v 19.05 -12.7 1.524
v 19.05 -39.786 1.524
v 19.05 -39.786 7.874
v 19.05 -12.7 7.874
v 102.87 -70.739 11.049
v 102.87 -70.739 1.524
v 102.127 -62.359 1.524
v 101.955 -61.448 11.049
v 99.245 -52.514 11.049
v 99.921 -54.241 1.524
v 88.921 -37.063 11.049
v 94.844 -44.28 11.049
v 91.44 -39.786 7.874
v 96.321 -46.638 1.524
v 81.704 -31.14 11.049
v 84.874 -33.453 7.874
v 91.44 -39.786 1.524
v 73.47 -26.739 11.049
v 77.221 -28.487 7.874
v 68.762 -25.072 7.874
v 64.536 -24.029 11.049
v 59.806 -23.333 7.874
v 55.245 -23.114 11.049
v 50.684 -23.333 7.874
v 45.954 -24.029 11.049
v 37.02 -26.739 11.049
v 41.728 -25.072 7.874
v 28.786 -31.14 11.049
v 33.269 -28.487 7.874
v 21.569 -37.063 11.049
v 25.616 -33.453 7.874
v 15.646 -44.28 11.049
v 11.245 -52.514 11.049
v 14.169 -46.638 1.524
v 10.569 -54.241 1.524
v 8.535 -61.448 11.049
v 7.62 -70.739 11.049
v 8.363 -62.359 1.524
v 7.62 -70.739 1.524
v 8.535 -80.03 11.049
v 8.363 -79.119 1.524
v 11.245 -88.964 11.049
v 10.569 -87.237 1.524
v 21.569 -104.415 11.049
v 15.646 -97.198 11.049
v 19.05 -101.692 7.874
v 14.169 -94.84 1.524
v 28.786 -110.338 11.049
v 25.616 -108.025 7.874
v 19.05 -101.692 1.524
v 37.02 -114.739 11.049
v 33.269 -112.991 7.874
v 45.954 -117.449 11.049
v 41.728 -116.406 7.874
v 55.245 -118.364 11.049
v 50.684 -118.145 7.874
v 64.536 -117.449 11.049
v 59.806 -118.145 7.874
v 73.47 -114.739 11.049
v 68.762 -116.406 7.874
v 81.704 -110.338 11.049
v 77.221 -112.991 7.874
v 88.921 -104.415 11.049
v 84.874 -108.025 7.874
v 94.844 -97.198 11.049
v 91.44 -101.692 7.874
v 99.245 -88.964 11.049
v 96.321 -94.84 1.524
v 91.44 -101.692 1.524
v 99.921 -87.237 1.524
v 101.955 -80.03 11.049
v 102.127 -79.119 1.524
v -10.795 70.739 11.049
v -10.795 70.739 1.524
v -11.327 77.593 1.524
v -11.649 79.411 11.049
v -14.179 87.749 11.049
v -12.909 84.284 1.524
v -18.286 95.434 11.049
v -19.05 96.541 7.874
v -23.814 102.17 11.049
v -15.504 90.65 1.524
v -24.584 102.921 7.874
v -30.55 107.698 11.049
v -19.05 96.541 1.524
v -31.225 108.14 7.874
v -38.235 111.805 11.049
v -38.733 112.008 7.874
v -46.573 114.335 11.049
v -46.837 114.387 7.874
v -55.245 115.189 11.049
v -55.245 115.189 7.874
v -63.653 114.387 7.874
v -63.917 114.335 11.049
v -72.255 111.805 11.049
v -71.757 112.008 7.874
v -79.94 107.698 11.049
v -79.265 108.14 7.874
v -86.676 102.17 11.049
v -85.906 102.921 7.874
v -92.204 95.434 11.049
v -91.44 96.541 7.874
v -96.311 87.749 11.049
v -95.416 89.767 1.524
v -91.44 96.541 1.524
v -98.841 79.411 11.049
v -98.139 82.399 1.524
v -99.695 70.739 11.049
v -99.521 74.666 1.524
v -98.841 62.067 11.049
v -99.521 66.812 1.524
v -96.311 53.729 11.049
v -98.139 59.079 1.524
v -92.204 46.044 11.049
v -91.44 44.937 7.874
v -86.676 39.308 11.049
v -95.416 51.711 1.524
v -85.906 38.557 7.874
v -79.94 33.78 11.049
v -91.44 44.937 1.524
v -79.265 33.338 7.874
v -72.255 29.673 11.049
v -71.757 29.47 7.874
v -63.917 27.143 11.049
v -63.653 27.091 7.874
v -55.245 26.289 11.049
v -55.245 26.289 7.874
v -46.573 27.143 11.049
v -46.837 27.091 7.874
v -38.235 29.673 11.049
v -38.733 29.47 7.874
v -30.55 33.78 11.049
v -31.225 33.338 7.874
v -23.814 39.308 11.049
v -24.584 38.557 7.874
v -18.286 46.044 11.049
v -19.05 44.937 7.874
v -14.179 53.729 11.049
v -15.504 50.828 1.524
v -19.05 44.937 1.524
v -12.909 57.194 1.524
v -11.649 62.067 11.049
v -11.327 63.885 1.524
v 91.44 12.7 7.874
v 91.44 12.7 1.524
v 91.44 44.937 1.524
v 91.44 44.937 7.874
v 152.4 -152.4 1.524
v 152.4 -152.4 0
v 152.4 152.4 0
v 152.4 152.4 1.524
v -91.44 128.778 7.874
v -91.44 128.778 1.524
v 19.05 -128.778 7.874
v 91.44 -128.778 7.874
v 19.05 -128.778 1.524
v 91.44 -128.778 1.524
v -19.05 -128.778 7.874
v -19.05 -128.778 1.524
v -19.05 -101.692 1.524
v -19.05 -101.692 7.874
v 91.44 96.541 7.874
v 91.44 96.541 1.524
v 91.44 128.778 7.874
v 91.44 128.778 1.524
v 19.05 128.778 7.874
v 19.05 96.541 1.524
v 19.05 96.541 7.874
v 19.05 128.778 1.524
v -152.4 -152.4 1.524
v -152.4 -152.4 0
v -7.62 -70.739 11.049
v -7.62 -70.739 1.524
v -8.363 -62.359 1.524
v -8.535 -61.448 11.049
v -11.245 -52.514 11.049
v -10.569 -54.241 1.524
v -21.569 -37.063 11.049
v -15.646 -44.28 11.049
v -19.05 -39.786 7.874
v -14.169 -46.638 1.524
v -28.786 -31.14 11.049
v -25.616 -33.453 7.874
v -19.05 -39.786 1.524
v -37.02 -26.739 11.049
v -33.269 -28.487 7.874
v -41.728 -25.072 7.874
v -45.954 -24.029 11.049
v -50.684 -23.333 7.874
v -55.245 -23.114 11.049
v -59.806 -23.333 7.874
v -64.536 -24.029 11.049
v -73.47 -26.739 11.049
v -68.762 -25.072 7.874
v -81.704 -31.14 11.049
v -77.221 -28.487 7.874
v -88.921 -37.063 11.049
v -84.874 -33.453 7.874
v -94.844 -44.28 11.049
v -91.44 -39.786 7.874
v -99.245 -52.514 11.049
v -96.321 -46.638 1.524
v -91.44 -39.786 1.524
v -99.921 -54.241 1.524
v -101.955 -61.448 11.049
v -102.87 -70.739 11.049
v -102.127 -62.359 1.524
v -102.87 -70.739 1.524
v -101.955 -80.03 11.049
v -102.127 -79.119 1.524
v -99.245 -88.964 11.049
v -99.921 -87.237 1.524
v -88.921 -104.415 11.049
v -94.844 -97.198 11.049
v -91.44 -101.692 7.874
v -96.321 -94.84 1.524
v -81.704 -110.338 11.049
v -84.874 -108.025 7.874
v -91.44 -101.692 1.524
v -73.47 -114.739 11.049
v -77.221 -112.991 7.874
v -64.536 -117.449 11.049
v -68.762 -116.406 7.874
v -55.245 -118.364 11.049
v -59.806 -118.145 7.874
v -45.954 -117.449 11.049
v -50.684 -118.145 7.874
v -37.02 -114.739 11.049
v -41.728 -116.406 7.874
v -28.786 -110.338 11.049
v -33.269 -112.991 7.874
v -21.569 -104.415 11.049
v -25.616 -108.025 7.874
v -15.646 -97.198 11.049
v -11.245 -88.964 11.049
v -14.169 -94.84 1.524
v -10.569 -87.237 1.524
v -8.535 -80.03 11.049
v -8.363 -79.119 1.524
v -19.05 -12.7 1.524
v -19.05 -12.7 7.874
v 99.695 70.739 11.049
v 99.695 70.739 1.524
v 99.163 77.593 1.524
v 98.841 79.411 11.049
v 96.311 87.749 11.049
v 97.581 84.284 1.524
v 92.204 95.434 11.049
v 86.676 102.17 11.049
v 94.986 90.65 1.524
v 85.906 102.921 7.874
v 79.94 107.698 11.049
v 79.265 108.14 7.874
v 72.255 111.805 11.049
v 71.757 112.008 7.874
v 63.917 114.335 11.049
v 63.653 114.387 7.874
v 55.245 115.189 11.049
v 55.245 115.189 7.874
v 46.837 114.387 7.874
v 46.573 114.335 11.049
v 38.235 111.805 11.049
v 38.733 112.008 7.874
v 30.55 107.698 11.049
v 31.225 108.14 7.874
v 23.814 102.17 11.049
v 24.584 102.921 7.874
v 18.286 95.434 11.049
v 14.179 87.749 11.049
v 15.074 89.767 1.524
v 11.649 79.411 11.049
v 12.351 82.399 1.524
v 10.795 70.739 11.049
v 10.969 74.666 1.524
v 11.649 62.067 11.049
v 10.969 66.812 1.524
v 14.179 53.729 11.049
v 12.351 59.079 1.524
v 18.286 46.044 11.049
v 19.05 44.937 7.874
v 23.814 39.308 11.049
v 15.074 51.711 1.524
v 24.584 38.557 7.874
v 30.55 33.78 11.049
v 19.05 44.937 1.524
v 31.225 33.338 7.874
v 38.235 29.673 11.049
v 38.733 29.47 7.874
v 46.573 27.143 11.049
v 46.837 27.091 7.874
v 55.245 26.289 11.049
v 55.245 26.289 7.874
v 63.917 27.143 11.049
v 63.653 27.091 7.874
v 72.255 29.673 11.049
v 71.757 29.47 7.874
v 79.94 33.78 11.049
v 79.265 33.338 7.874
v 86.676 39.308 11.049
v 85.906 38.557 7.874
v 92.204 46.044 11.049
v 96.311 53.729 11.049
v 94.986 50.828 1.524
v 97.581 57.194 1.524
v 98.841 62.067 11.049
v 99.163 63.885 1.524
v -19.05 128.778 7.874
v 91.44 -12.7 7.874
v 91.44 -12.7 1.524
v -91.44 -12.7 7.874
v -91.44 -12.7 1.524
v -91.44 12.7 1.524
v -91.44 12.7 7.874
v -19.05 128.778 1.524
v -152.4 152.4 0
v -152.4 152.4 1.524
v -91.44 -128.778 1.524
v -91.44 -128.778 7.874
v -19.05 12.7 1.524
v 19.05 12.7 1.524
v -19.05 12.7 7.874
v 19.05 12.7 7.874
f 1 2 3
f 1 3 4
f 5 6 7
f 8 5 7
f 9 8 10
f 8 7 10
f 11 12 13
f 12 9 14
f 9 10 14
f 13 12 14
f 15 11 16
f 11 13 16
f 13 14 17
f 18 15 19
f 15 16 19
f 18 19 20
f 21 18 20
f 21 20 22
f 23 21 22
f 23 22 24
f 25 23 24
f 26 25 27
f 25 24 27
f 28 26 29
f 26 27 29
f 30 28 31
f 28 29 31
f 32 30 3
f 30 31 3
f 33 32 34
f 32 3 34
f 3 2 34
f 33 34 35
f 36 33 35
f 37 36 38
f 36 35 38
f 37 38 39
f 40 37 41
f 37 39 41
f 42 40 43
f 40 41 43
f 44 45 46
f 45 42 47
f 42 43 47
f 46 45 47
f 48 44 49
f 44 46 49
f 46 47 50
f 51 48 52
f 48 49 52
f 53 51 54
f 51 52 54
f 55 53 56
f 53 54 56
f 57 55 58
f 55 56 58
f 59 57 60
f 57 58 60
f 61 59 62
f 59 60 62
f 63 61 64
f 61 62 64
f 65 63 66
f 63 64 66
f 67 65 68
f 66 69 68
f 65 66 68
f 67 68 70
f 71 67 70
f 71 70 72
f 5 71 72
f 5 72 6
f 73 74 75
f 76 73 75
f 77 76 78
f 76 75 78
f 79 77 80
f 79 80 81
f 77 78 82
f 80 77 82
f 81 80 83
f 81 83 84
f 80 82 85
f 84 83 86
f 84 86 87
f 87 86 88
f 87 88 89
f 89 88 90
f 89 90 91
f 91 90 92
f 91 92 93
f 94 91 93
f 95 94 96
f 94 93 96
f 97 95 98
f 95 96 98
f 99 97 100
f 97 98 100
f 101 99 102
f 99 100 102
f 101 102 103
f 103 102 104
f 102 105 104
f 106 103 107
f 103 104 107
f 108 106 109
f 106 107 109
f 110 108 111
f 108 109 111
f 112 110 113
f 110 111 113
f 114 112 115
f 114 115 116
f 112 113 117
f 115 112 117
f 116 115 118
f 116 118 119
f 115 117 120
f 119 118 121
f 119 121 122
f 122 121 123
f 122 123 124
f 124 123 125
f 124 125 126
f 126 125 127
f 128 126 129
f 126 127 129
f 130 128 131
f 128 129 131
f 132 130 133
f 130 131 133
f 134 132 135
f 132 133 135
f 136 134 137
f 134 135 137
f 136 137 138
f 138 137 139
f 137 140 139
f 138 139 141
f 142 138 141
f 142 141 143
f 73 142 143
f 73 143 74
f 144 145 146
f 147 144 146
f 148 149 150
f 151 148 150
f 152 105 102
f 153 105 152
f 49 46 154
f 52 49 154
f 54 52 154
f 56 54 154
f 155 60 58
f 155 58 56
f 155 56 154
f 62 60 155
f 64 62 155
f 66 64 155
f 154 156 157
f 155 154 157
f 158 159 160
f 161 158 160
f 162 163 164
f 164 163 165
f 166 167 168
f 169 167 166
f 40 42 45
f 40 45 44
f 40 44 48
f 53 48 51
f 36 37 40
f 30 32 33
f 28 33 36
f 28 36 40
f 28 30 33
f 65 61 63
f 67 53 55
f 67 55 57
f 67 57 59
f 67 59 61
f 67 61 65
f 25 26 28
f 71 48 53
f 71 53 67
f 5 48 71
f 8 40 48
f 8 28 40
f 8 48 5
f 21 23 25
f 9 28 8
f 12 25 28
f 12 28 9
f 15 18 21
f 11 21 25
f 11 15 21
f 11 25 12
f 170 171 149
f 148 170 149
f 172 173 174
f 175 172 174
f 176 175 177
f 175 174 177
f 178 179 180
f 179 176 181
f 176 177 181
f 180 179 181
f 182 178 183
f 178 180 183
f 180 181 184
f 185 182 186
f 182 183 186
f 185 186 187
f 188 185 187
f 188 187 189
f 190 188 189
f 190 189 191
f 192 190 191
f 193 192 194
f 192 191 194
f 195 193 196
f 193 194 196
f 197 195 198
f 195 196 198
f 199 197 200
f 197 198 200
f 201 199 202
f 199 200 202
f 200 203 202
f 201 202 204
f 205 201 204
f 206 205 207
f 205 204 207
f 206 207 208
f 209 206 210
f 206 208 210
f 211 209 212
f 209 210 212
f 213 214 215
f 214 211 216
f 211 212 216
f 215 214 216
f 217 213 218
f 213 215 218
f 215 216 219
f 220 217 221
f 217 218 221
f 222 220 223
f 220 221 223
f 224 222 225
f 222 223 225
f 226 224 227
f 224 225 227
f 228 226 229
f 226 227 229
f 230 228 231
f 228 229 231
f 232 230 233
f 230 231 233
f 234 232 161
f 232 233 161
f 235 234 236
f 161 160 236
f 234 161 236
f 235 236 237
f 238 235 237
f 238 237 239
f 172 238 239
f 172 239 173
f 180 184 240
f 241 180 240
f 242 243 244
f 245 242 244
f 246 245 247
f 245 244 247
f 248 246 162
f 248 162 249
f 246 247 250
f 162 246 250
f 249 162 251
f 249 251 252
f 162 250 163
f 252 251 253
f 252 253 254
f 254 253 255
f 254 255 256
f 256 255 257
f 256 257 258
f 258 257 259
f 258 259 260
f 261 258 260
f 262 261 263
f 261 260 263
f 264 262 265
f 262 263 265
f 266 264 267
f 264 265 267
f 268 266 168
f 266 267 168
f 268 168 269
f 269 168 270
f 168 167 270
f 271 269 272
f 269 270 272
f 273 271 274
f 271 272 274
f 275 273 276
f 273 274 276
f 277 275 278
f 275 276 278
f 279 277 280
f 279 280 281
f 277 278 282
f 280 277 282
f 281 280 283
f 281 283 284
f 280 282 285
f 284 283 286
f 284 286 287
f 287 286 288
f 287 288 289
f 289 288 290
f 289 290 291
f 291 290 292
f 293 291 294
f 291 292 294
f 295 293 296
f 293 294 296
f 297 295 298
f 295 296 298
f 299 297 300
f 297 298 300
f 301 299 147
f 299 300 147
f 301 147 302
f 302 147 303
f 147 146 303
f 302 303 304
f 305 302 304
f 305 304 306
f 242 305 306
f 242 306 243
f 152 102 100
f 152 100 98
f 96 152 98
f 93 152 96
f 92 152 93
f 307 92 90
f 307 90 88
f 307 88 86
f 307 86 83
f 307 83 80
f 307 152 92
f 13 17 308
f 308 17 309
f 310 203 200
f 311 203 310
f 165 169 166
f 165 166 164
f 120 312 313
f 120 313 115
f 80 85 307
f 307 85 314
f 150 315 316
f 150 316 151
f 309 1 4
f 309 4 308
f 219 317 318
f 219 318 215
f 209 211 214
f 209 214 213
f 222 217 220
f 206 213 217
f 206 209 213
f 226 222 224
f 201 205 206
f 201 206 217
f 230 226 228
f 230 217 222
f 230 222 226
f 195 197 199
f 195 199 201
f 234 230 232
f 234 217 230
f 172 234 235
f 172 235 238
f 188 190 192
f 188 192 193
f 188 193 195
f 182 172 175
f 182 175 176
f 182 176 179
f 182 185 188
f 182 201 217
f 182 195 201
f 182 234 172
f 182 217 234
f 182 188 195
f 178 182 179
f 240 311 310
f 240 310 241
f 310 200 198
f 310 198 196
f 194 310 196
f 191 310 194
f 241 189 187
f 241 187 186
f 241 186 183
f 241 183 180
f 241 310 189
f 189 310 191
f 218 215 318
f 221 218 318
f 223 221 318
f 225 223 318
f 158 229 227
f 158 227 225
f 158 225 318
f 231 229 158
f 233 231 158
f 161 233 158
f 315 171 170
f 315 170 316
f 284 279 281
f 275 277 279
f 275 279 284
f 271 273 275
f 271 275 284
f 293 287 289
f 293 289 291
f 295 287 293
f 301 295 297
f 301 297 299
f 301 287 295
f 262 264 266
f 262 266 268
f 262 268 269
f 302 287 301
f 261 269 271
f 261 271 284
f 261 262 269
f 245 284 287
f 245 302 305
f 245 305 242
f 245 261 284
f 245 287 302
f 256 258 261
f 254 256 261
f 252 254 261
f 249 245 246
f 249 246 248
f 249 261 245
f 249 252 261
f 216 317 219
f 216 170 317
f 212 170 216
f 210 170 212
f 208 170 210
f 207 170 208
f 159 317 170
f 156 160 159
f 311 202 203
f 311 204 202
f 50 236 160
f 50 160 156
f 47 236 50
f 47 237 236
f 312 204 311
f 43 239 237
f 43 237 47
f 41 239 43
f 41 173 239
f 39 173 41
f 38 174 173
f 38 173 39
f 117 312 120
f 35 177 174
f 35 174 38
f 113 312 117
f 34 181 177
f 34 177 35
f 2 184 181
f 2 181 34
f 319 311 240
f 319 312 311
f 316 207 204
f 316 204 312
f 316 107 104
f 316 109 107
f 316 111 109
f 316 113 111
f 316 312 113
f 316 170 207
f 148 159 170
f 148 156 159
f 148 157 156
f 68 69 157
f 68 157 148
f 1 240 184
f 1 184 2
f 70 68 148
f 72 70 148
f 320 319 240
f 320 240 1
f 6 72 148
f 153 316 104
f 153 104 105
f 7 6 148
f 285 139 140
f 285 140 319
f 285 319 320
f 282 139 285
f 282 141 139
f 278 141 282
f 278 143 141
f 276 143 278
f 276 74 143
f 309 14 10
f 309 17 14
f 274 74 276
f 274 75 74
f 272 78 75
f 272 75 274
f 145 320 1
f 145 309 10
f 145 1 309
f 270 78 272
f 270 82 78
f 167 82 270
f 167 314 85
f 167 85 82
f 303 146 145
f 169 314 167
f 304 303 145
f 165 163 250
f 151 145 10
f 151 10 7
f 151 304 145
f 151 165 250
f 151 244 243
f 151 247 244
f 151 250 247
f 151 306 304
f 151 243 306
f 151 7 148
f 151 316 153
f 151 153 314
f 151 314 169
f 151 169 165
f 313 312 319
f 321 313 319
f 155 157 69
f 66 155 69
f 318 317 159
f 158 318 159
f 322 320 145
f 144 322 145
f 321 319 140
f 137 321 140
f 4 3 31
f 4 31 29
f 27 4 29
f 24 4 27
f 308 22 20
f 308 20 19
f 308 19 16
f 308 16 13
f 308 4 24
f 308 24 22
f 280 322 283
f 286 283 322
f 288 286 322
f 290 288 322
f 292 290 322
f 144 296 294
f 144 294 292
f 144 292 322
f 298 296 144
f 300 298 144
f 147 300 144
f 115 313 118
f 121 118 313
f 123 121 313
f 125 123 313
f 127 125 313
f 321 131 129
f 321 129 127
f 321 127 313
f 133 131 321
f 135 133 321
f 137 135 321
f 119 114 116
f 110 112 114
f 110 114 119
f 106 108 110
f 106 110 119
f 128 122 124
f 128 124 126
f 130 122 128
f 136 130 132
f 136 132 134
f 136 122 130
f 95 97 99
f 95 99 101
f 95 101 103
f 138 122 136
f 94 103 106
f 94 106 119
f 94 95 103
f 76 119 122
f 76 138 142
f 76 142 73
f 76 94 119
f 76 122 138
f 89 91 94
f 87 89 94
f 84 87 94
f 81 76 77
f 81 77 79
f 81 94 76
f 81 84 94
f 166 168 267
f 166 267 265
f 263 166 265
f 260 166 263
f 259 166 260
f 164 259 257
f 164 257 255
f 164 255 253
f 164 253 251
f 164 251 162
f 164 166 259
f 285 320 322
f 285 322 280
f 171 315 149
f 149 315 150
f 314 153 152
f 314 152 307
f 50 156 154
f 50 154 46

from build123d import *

# Parameters (mm, degrees)
F0_W     = 304.8
F0_H     = 304.8
F1_DEPTH = 1.524
F2_W     = 72.39
F2_H     = 116.078
F3_DEPTH = 6.35
F4_R     = 44.45
F4_R_2   = 47.625
F5_DEPTH = 9.525


with BuildPart() as f1:
    # F0 (on Top) → F1 (new body)
    with BuildSketch(Plane.XY):
        Rectangle(F0_W, F0_H)
    extrude(amount=F1_DEPTH)

    # F2 (on face) → F3 (join)
    with BuildSketch(Plane.XY.offset(1.524)):
        with Locations((-55.245, 70.739)):
            Rectangle(F2_W, F2_H)
        with Locations((55.245, 70.739)):
            Rectangle(F2_W, F2_H)
        with Locations((-55.245, -70.739)):
            Rectangle(F2_W, F2_H)
        with Locations((55.245, -70.739)):
            Rectangle(F2_W, F2_H)
    extrude(amount=F3_DEPTH)

    # F4 (on face) → F5 (join)
    with BuildSketch(Plane.XY.offset(1.524)):
        with Locations((-55.245, 70.739)):
            Circle(F4_R)
        with Locations((55.245, 70.739)):
            Circle(F4_R)
        with Locations((-55.245, -70.739)):
            Circle(F4_R_2)
        with Locations((55.245, -70.739)):
            Circle(F4_R_2)
    extrude(amount=F5_DEPTH)


solid = f1.part
